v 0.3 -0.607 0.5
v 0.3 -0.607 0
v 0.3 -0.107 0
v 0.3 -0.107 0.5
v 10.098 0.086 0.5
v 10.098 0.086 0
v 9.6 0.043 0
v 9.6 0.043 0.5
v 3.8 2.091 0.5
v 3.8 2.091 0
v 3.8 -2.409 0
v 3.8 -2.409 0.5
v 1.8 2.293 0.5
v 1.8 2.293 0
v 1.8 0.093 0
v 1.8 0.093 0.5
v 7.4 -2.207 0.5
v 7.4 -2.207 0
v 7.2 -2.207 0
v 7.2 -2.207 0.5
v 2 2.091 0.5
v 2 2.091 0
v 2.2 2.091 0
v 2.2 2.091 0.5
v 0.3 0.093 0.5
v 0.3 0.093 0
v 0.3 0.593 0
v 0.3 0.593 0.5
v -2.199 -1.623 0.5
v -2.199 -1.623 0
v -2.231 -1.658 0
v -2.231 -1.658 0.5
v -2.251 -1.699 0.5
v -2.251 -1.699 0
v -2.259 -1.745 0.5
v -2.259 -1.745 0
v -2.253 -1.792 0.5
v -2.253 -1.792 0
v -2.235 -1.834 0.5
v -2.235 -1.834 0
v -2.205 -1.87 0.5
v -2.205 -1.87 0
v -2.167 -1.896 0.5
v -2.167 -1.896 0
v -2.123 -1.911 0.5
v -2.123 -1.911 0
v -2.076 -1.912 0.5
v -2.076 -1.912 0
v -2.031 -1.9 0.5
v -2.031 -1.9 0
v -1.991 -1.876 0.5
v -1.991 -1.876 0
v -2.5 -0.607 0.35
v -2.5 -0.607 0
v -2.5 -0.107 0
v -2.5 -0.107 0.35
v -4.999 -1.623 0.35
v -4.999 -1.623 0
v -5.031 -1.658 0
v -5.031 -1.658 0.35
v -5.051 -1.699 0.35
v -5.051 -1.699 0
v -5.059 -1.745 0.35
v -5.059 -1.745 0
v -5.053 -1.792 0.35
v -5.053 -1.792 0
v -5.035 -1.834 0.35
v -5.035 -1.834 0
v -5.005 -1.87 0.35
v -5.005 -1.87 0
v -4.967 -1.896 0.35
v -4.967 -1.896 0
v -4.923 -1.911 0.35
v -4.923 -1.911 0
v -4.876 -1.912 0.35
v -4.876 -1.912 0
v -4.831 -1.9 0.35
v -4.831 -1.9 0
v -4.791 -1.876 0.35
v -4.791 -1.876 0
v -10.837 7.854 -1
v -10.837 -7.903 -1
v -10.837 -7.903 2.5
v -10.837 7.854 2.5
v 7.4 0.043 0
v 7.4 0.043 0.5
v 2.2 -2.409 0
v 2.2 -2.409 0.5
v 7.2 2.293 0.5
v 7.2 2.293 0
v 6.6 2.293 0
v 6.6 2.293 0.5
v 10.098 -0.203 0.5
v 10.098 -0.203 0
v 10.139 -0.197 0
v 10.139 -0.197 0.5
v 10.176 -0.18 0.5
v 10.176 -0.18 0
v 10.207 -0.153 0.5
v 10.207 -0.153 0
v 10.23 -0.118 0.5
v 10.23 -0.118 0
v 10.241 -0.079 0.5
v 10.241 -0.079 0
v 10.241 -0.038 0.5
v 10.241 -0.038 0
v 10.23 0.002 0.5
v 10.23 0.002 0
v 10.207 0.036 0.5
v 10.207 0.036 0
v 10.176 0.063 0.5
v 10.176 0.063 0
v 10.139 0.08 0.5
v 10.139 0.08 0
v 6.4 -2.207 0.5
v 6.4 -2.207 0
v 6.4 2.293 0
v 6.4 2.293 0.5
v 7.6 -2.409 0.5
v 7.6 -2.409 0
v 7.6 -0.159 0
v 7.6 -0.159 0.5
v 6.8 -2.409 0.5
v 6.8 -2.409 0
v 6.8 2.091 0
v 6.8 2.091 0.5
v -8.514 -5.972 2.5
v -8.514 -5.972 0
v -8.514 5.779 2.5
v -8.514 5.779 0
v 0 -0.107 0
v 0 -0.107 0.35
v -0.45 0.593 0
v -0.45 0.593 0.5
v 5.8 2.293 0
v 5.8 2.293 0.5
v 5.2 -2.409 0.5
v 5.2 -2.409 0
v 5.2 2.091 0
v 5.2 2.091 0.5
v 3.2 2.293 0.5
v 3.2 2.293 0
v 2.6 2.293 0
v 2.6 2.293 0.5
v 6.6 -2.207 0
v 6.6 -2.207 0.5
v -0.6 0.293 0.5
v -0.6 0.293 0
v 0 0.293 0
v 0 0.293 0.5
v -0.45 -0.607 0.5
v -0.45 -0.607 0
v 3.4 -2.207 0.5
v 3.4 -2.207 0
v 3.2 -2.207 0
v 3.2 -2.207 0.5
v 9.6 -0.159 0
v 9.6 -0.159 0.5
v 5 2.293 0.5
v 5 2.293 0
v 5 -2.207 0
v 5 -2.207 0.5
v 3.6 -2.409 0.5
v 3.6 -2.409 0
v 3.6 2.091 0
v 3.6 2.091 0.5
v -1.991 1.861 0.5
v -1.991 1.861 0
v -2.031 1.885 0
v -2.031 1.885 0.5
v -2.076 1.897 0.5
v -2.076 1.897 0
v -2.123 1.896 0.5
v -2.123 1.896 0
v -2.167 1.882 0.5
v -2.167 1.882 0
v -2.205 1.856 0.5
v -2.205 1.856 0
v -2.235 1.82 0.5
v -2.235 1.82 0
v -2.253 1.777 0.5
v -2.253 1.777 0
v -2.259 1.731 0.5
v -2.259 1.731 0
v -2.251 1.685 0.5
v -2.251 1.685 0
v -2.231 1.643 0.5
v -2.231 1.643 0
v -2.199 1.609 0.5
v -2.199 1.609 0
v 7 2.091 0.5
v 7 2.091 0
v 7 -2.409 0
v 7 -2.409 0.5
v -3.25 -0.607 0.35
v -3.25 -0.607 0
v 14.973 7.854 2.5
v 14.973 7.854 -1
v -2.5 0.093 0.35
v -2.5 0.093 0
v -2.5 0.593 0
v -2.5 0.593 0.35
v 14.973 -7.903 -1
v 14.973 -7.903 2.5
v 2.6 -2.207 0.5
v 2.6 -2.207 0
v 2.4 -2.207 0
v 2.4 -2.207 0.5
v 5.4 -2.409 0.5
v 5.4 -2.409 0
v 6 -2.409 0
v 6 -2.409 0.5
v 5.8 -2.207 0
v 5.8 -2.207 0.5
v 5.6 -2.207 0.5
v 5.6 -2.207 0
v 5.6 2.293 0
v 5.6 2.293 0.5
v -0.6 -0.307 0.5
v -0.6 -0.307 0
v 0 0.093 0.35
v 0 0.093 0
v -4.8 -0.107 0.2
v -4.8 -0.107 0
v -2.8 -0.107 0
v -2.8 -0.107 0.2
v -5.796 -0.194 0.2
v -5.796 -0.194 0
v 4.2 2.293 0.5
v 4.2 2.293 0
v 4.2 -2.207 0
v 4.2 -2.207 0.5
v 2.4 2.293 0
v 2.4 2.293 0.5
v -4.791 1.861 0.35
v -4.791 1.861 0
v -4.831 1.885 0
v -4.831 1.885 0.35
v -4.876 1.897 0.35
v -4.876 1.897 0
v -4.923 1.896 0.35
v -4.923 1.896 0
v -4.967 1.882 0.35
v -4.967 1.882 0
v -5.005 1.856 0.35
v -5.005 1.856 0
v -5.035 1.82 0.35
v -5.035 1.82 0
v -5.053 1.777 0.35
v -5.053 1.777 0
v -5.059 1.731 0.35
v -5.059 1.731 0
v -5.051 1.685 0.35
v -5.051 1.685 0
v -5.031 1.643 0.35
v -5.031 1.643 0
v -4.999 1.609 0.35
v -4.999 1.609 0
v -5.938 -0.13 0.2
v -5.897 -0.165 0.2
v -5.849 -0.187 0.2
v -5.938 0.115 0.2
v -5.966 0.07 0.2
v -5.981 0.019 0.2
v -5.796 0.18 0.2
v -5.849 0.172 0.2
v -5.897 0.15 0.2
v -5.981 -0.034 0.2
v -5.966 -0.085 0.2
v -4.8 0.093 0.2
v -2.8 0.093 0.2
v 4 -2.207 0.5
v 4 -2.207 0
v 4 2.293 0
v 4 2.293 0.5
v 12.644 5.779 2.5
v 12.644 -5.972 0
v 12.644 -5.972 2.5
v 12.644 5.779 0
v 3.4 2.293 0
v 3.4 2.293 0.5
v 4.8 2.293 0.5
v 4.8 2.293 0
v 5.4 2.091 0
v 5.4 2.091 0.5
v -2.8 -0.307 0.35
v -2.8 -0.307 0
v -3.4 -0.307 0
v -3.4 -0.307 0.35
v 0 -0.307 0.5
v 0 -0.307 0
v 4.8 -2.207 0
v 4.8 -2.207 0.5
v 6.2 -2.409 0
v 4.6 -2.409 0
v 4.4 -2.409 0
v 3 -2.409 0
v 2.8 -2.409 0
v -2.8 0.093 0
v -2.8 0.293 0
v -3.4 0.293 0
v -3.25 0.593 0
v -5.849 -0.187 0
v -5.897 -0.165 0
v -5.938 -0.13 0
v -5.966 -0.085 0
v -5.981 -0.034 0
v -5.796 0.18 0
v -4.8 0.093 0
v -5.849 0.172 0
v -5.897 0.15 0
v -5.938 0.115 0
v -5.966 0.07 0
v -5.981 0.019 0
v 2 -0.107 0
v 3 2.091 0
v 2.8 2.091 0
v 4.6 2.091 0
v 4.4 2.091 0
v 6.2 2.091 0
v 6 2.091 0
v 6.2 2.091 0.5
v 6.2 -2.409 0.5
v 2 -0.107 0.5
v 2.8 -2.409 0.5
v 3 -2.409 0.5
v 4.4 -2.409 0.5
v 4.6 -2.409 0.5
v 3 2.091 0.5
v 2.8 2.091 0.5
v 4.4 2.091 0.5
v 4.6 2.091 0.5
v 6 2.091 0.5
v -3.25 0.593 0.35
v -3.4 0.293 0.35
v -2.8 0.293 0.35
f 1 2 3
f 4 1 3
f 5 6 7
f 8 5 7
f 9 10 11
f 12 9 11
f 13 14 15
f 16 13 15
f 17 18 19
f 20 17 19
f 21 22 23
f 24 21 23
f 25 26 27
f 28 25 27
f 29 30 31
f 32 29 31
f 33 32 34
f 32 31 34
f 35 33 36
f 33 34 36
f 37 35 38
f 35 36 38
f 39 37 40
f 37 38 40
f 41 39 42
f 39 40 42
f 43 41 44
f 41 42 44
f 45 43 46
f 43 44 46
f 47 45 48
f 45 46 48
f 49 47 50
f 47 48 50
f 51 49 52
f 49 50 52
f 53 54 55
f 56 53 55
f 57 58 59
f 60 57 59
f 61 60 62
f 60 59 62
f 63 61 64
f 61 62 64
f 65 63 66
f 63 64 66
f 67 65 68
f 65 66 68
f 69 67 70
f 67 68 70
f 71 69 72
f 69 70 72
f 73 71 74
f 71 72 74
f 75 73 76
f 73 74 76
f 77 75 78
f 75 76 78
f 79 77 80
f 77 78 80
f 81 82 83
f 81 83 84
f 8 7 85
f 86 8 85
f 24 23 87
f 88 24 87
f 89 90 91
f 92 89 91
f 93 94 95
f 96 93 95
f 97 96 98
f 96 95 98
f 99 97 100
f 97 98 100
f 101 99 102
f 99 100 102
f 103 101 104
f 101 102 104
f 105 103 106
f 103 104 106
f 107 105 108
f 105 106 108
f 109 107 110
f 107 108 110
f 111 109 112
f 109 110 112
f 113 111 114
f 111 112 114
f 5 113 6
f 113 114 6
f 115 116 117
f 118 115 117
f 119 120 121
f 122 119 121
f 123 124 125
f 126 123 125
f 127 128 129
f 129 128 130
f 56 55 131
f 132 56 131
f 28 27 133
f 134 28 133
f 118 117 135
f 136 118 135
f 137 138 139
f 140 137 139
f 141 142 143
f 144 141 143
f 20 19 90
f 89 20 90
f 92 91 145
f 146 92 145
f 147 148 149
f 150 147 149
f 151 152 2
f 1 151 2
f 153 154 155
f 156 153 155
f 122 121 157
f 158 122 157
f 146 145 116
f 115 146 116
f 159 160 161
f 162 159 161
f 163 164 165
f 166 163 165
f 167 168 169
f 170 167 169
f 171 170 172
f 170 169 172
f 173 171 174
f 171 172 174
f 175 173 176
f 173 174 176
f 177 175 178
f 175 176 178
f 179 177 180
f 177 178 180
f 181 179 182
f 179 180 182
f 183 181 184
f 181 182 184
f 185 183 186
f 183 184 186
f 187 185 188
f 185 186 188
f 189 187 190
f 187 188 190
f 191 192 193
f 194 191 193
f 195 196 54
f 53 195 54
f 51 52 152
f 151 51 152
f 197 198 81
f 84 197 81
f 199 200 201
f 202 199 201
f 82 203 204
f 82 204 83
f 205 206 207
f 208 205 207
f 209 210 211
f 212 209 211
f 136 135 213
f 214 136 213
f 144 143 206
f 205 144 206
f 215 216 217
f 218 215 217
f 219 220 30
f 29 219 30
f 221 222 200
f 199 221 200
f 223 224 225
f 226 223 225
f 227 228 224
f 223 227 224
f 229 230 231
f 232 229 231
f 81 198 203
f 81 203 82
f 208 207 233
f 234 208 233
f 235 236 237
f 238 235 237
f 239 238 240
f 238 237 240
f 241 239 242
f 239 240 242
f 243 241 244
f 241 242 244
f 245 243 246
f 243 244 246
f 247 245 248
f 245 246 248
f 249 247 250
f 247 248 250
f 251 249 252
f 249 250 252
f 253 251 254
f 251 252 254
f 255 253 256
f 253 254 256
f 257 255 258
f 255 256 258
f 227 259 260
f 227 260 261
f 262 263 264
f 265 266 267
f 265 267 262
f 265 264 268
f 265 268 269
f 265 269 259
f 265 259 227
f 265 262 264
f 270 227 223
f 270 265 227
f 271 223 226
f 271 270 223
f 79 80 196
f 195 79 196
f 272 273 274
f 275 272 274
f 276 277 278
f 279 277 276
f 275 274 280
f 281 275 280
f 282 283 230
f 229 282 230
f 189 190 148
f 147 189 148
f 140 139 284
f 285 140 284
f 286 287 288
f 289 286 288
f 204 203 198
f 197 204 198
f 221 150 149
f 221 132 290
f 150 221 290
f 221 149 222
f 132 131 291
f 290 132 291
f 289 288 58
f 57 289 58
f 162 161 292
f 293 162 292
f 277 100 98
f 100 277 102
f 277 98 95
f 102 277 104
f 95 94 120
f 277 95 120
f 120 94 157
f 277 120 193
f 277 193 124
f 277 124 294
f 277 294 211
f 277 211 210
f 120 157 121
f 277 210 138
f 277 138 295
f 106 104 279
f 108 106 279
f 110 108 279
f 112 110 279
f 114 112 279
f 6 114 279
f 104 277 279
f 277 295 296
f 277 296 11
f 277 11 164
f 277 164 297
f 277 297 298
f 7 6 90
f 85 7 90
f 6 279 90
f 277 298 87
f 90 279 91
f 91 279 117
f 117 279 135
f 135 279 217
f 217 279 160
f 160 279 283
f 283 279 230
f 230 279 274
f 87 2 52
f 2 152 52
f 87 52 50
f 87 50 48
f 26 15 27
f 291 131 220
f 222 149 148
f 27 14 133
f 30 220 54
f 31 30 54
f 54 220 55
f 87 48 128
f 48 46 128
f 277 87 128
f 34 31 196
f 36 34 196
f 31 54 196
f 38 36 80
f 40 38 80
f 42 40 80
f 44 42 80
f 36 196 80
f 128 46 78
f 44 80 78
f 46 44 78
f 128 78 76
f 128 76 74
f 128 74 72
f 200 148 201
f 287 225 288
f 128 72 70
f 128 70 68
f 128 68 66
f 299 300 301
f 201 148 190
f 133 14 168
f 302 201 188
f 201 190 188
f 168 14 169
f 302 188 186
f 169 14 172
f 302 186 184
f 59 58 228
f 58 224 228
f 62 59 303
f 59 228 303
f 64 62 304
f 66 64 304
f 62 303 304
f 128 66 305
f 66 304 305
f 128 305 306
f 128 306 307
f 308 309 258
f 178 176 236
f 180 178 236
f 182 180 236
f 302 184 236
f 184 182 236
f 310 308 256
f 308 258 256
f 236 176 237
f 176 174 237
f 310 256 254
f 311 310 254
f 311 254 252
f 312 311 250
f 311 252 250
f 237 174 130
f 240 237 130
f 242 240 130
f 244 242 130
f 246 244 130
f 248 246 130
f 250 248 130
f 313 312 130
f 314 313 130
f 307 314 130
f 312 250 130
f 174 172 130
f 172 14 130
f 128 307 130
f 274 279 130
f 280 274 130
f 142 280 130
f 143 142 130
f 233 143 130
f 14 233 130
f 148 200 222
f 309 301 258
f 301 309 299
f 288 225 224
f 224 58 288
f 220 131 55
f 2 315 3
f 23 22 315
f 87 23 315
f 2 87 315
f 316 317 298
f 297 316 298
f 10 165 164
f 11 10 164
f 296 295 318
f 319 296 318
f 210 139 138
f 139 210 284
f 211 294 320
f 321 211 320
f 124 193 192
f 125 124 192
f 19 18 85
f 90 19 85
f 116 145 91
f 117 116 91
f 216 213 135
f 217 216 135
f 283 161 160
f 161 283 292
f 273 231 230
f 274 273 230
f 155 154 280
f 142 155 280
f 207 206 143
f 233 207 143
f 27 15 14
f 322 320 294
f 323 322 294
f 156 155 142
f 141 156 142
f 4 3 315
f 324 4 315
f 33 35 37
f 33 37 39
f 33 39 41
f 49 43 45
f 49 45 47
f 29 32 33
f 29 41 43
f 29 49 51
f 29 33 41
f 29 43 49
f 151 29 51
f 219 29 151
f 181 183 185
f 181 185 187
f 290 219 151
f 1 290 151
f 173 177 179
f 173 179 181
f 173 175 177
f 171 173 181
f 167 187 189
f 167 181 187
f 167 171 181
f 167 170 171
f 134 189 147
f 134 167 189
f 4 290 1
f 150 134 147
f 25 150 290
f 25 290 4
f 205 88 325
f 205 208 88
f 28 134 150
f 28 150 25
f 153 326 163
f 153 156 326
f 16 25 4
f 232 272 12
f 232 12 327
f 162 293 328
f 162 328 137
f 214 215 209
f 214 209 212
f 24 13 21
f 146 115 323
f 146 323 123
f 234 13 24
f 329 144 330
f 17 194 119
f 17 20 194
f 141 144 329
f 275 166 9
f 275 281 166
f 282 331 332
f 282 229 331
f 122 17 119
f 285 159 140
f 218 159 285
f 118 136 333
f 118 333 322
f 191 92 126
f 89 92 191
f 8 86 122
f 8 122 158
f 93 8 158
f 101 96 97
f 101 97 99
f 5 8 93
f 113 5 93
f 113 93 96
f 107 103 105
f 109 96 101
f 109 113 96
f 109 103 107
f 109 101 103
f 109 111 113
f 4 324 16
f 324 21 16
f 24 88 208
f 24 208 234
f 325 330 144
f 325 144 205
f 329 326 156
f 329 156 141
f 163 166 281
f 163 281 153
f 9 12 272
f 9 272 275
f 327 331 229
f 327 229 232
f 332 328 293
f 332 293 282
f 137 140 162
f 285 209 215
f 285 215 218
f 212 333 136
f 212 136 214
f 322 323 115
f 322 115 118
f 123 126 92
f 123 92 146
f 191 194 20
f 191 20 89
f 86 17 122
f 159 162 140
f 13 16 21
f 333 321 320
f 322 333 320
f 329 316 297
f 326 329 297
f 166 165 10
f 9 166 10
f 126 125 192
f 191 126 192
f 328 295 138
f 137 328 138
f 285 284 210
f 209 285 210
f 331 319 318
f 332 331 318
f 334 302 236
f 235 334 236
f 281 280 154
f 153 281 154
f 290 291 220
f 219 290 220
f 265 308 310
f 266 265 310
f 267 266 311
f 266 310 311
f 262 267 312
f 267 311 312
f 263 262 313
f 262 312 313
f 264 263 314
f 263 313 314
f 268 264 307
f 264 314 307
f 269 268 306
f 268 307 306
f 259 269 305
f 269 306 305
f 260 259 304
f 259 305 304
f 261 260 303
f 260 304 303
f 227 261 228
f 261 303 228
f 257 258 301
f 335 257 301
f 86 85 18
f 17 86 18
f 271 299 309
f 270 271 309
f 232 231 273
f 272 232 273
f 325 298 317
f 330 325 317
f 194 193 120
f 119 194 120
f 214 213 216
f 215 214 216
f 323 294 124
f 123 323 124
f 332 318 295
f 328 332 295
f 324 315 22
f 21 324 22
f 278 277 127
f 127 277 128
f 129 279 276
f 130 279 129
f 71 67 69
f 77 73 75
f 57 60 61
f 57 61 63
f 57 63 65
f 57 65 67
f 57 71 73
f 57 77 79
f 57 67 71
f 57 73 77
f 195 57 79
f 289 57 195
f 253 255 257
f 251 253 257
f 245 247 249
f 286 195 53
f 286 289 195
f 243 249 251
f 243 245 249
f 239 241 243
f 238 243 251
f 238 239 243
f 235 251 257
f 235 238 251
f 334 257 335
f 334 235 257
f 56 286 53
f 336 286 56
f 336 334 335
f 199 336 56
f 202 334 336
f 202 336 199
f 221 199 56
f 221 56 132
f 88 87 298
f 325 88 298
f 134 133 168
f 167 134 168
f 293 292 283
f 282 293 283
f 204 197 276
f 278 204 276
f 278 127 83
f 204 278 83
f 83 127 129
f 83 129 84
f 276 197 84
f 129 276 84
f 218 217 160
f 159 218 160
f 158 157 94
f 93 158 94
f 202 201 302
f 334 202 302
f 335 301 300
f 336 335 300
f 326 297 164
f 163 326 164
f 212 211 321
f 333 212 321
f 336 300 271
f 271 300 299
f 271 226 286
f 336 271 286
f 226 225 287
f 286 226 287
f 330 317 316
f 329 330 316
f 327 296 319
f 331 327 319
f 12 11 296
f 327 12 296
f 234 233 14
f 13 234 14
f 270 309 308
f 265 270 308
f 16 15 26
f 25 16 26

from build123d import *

# Parameters (mm, degrees)
BOSS_EXTRUDE4_DEPTH = 0.2
BOSS_EXTRUDE5_DEPTH = 0.35
BOSS_EXTRUDE6_DEPTH = 0.5
SKETCH5_W           = 21.158330311
SKETCH5_H           = 11.75153324
BOSS_EXTRUDE7_DEPTH = 1
SKETCH8_W           = 25.80987528
SKETCH8_H           = 15.757102731
SKETCH8_W_2         = 21.158330311
SKETCH8_H_2         = 11.75153324
BOSS_EXTRUDE8_DEPTH = 3.5


with BuildPart() as part:
    # Sketch1 → Boss-Extrude4 (new body)
    with BuildSketch(Plane.XY):
        with BuildLine():
            Line((-4.8, 0.09272626), (-5.796194698, 0.179882003))
            ThreePointArc((-5.796194698, 0.179882003), (-5.983350441, -0.00727374), (-5.796194698, -0.194429483))
            Line((-5.796194698, -0.194429483), (-4.8, -0.10727374))
            Line((-4.8, -0.10727374), (-2.8, -0.10727374))
            Line((-2.8, -0.10727374), (-2.8, 0.09272626))
            Line((-2.8, 0.09272626), (-4.8, 0.09272626))
        make_face()
    extrude(amount=BOSS_EXTRUDE4_DEPTH)

    # Sketch1<7> → Boss-Extrude5 (add)
    with BuildSketch(Plane.XY):
        with BuildLine():
            Line((-2.8, 0.29272626), (-2.8, 0.09272626))
            Line((-2.8, 0.09272626), (-2.8, -0.10727374))
            Line((-2.8, -0.10727374), (-2.8, -0.30727374))
            Line((-2.8, -0.30727374), (-3.4, -0.30727374))
            Line((-3.4, -0.30727374), (-4.999165526, -1.623297206))
            ThreePointArc((-4.999165526, -1.623297206), (-5.02151566, -1.853410903), (-4.791401964, -1.875761037))
            Line((-4.791401964, -1.875761037), (-3.25, -0.60727374))
            Line((-3.25, -0.60727374), (-2.5, -0.60727374))
            Line((-2.5, -0.60727374), (-2.5, -0.10727374))
            Line((-2.5, -0.10727374), (0, -0.10727374))
            Line((0, -0.10727374), (0, 0.09272626))
            Line((0, 0.09272626), (-2.5, 0.09272626))
            Line((-2.5, 0.09272626), (-2.5, 0.59272626))
            Line((-2.5, 0.59272626), (-3.25, 0.59272626))
            Line((-3.25, 0.59272626), (-4.791401964, 1.861213558))
            ThreePointArc((-4.791401964, 1.861213558), (-5.02151566, 1.838863423), (-4.999165526, 1.608749727))
            Line((-4.999165526, 1.608749727), (-3.4, 0.29272626))
            Line((-3.4, 0.29272626), (-2.8, 0.29272626))
        make_face()
    extrude(amount=BOSS_EXTRUDE5_DEPTH)

    # Sketch1<8> → Boss-Extrude6 (add)
    with BuildSketch(Plane.XY):
        with BuildLine():
            Line((0, 0.29272626), (0, -0.30727374))
            Line((0, -0.30727374), (-0.6, -0.30727374))
            Line((-0.6, -0.30727374), (-2.199165526, -1.623297206))
            ThreePointArc((-2.199165526, -1.623297206), (-2.22151566, -1.853410903), (-1.991401964, -1.875761037))
            Line((-1.991401964, -1.875761037), (-0.45, -0.60727374))
            Line((-0.45, -0.60727374), (0.3, -0.60727374))
            Line((0.3, -0.60727374), (0.3, -0.10727374))
            Line((0.3, -0.10727374), (2, -0.10727374))
            Line((2, -0.10727374), (2, 2.090619677))
            Line((2, 2.090619677), (2.2, 2.090619677))
            Line((2.2, 2.090619677), (2.2, -2.409380323))
            Line((2.2, -2.409380323), (2.8, -2.409380323))
            Line((2.8, -2.409380323), (2.8, 2.090619677))
            Line((2.8, 2.090619677), (3, 2.090619677))
            Line((3, 2.090619677), (3, -2.409380323))
            Line((3, -2.409380323), (3.6, -2.409380323))
            Line((3.6, -2.409380323), (3.6, 2.090619677))
            Line((3.6, 2.090619677), (3.8, 2.090619677))
            Line((3.8, 2.090619677), (3.8, -2.409380323))
            Line((3.8, -2.409380323), (4.4, -2.409380323))
            Line((4.4, -2.409380323), (4.4, 2.090619677))
            Line((4.4, 2.090619677), (4.6, 2.090619677))
            Line((4.6, 2.090619677), (4.6, -2.409380323))
            Line((4.6, -2.409380323), (5.2, -2.409380323))
            Line((5.2, -2.409380323), (5.2, 2.090619677))
            Line((5.2, 2.090619677), (5.4, 2.090619677))
            Line((5.4, 2.090619677), (5.4, -2.409380323))
            Line((5.4, -2.409380323), (6, -2.409380323))
            Line((6, -2.409380323), (6, 2.090619677))
            Line((6, 2.090619677), (6.2, 2.090619677))
            Line((6.2, 2.090619677), (6.2, -2.409380323))
            Line((6.2, -2.409380323), (6.8, -2.409380323))
            Line((6.8, -2.409380323), (6.8, 2.090619677))
            Line((6.8, 2.090619677), (7, 2.090619677))
            Line((7, 2.090619677), (7, -2.409380323))
            Line((7, -2.409380323), (7.6, -2.409380323))
            Line((7.6, -2.409380323), (7.6, -0.159380323))
            Line((7.6, -0.159380323), (9.6, -0.159380323))
            Line((9.6, -0.159380323), (10.098097349, -0.202958194))
            ThreePointArc((10.098097349, -0.202958194), (10.242728512, -0.058327031), (10.098097349, 0.086304132))
            Line((10.098097349, 0.086304132), (9.6, 0.04272626))
            Line((9.6, 0.04272626), (7.4, 0.04272626))
            Line((7.4, 0.04272626), (7.4, -2.20727374))
            Line((7.4, -2.20727374), (7.2, -2.20727374))
            Line((7.2, -2.20727374), (7.2, 2.29272626))
            Line((7.2, 2.29272626), (6.6, 2.29272626))
            Line((6.6, 2.29272626), (6.6, -2.20727374))
            Line((6.6, -2.20727374), (6.4, -2.20727374))
            Line((6.4, -2.20727374), (6.4, 2.29272626))
            Line((6.4, 2.29272626), (5.8, 2.29272626))
            Line((5.8, 2.29272626), (5.8, -2.20727374))
            Line((5.8, -2.20727374), (5.6, -2.20727374))
            Line((5.6, -2.20727374), (5.6, 2.29272626))
            Line((5.6, 2.29272626), (5, 2.29272626))
            Line((5, 2.29272626), (5, -2.20727374))
            Line((5, -2.20727374), (4.8, -2.20727374))
            Line((4.8, -2.20727374), (4.8, 2.29272626))
            Line((4.8, 2.29272626), (4.2, 2.29272626))
            Line((4.2, 2.29272626), (4.2, -2.20727374))
            Line((4.2, -2.20727374), (4, -2.20727374))
            Line((4, -2.20727374), (4, 2.29272626))
            Line((4, 2.29272626), (3.4, 2.29272626))
            Line((3.4, 2.29272626), (3.4, -2.20727374))
            Line((3.4, -2.20727374), (3.2, -2.20727374))
            Line((3.2, -2.20727374), (3.2, 2.29272626))
            Line((3.2, 2.29272626), (2.6, 2.29272626))
            Line((2.6, 2.29272626), (2.6, -2.20727374))
            Line((2.6, -2.20727374), (2.4, -2.20727374))
            Line((2.4, -2.20727374), (2.4, 2.29272626))
            Line((2.4, 2.29272626), (1.8, 2.29272626))
            Line((1.8, 2.29272626), (1.8, 0.09272626))
            Line((1.8, 0.09272626), (0.3, 0.09272626))
            Line((0.3, 0.09272626), (0.3, 0.59272626))
            Line((0.3, 0.59272626), (-0.45, 0.59272626))
            Line((-0.45, 0.59272626), (-1.991401964, 1.861213558))
            ThreePointArc((-1.991401964, 1.861213558), (-2.22151566, 1.838863423), (-2.199165526, 1.608749727))
            Line((-2.199165526, 1.608749727), (-0.6, 0.29272626))
            Line((-0.6, 0.29272626), (0, 0.29272626))
        make_face()
    extrude(amount=BOSS_EXTRUDE6_DEPTH)

    # Sketch5 → Boss-Extrude7 (add)
    with BuildSketch(Plane(origin=(0, 0, 0), x_dir=(-1, 0, 0), z_dir=(0, 0, -1))):
        with Locations((-2.065173388, -0.096435412)):
            Rectangle(SKETCH5_W, SKETCH5_H)
    extrude(amount=BOSS_EXTRUDE7_DEPTH)

    # Sketch8 → Boss-Extrude8 (add)
    with BuildSketch(Plane(origin=(0, 0, -1), x_dir=(-1, 0, 0), z_dir=(0, 0, -1))):
        with Locations((-2.067728751, -0.024369167)):
            Rectangle(SKETCH8_W, SKETCH8_H)
        with Locations((-2.065173388, -0.096435412)):
            Rectangle(SKETCH8_W_2, SKETCH8_H_2, mode=Mode.SUBTRACT)
    extrude(amount=-BOSS_EXTRUDE8_DEPTH)


solid = part.part
